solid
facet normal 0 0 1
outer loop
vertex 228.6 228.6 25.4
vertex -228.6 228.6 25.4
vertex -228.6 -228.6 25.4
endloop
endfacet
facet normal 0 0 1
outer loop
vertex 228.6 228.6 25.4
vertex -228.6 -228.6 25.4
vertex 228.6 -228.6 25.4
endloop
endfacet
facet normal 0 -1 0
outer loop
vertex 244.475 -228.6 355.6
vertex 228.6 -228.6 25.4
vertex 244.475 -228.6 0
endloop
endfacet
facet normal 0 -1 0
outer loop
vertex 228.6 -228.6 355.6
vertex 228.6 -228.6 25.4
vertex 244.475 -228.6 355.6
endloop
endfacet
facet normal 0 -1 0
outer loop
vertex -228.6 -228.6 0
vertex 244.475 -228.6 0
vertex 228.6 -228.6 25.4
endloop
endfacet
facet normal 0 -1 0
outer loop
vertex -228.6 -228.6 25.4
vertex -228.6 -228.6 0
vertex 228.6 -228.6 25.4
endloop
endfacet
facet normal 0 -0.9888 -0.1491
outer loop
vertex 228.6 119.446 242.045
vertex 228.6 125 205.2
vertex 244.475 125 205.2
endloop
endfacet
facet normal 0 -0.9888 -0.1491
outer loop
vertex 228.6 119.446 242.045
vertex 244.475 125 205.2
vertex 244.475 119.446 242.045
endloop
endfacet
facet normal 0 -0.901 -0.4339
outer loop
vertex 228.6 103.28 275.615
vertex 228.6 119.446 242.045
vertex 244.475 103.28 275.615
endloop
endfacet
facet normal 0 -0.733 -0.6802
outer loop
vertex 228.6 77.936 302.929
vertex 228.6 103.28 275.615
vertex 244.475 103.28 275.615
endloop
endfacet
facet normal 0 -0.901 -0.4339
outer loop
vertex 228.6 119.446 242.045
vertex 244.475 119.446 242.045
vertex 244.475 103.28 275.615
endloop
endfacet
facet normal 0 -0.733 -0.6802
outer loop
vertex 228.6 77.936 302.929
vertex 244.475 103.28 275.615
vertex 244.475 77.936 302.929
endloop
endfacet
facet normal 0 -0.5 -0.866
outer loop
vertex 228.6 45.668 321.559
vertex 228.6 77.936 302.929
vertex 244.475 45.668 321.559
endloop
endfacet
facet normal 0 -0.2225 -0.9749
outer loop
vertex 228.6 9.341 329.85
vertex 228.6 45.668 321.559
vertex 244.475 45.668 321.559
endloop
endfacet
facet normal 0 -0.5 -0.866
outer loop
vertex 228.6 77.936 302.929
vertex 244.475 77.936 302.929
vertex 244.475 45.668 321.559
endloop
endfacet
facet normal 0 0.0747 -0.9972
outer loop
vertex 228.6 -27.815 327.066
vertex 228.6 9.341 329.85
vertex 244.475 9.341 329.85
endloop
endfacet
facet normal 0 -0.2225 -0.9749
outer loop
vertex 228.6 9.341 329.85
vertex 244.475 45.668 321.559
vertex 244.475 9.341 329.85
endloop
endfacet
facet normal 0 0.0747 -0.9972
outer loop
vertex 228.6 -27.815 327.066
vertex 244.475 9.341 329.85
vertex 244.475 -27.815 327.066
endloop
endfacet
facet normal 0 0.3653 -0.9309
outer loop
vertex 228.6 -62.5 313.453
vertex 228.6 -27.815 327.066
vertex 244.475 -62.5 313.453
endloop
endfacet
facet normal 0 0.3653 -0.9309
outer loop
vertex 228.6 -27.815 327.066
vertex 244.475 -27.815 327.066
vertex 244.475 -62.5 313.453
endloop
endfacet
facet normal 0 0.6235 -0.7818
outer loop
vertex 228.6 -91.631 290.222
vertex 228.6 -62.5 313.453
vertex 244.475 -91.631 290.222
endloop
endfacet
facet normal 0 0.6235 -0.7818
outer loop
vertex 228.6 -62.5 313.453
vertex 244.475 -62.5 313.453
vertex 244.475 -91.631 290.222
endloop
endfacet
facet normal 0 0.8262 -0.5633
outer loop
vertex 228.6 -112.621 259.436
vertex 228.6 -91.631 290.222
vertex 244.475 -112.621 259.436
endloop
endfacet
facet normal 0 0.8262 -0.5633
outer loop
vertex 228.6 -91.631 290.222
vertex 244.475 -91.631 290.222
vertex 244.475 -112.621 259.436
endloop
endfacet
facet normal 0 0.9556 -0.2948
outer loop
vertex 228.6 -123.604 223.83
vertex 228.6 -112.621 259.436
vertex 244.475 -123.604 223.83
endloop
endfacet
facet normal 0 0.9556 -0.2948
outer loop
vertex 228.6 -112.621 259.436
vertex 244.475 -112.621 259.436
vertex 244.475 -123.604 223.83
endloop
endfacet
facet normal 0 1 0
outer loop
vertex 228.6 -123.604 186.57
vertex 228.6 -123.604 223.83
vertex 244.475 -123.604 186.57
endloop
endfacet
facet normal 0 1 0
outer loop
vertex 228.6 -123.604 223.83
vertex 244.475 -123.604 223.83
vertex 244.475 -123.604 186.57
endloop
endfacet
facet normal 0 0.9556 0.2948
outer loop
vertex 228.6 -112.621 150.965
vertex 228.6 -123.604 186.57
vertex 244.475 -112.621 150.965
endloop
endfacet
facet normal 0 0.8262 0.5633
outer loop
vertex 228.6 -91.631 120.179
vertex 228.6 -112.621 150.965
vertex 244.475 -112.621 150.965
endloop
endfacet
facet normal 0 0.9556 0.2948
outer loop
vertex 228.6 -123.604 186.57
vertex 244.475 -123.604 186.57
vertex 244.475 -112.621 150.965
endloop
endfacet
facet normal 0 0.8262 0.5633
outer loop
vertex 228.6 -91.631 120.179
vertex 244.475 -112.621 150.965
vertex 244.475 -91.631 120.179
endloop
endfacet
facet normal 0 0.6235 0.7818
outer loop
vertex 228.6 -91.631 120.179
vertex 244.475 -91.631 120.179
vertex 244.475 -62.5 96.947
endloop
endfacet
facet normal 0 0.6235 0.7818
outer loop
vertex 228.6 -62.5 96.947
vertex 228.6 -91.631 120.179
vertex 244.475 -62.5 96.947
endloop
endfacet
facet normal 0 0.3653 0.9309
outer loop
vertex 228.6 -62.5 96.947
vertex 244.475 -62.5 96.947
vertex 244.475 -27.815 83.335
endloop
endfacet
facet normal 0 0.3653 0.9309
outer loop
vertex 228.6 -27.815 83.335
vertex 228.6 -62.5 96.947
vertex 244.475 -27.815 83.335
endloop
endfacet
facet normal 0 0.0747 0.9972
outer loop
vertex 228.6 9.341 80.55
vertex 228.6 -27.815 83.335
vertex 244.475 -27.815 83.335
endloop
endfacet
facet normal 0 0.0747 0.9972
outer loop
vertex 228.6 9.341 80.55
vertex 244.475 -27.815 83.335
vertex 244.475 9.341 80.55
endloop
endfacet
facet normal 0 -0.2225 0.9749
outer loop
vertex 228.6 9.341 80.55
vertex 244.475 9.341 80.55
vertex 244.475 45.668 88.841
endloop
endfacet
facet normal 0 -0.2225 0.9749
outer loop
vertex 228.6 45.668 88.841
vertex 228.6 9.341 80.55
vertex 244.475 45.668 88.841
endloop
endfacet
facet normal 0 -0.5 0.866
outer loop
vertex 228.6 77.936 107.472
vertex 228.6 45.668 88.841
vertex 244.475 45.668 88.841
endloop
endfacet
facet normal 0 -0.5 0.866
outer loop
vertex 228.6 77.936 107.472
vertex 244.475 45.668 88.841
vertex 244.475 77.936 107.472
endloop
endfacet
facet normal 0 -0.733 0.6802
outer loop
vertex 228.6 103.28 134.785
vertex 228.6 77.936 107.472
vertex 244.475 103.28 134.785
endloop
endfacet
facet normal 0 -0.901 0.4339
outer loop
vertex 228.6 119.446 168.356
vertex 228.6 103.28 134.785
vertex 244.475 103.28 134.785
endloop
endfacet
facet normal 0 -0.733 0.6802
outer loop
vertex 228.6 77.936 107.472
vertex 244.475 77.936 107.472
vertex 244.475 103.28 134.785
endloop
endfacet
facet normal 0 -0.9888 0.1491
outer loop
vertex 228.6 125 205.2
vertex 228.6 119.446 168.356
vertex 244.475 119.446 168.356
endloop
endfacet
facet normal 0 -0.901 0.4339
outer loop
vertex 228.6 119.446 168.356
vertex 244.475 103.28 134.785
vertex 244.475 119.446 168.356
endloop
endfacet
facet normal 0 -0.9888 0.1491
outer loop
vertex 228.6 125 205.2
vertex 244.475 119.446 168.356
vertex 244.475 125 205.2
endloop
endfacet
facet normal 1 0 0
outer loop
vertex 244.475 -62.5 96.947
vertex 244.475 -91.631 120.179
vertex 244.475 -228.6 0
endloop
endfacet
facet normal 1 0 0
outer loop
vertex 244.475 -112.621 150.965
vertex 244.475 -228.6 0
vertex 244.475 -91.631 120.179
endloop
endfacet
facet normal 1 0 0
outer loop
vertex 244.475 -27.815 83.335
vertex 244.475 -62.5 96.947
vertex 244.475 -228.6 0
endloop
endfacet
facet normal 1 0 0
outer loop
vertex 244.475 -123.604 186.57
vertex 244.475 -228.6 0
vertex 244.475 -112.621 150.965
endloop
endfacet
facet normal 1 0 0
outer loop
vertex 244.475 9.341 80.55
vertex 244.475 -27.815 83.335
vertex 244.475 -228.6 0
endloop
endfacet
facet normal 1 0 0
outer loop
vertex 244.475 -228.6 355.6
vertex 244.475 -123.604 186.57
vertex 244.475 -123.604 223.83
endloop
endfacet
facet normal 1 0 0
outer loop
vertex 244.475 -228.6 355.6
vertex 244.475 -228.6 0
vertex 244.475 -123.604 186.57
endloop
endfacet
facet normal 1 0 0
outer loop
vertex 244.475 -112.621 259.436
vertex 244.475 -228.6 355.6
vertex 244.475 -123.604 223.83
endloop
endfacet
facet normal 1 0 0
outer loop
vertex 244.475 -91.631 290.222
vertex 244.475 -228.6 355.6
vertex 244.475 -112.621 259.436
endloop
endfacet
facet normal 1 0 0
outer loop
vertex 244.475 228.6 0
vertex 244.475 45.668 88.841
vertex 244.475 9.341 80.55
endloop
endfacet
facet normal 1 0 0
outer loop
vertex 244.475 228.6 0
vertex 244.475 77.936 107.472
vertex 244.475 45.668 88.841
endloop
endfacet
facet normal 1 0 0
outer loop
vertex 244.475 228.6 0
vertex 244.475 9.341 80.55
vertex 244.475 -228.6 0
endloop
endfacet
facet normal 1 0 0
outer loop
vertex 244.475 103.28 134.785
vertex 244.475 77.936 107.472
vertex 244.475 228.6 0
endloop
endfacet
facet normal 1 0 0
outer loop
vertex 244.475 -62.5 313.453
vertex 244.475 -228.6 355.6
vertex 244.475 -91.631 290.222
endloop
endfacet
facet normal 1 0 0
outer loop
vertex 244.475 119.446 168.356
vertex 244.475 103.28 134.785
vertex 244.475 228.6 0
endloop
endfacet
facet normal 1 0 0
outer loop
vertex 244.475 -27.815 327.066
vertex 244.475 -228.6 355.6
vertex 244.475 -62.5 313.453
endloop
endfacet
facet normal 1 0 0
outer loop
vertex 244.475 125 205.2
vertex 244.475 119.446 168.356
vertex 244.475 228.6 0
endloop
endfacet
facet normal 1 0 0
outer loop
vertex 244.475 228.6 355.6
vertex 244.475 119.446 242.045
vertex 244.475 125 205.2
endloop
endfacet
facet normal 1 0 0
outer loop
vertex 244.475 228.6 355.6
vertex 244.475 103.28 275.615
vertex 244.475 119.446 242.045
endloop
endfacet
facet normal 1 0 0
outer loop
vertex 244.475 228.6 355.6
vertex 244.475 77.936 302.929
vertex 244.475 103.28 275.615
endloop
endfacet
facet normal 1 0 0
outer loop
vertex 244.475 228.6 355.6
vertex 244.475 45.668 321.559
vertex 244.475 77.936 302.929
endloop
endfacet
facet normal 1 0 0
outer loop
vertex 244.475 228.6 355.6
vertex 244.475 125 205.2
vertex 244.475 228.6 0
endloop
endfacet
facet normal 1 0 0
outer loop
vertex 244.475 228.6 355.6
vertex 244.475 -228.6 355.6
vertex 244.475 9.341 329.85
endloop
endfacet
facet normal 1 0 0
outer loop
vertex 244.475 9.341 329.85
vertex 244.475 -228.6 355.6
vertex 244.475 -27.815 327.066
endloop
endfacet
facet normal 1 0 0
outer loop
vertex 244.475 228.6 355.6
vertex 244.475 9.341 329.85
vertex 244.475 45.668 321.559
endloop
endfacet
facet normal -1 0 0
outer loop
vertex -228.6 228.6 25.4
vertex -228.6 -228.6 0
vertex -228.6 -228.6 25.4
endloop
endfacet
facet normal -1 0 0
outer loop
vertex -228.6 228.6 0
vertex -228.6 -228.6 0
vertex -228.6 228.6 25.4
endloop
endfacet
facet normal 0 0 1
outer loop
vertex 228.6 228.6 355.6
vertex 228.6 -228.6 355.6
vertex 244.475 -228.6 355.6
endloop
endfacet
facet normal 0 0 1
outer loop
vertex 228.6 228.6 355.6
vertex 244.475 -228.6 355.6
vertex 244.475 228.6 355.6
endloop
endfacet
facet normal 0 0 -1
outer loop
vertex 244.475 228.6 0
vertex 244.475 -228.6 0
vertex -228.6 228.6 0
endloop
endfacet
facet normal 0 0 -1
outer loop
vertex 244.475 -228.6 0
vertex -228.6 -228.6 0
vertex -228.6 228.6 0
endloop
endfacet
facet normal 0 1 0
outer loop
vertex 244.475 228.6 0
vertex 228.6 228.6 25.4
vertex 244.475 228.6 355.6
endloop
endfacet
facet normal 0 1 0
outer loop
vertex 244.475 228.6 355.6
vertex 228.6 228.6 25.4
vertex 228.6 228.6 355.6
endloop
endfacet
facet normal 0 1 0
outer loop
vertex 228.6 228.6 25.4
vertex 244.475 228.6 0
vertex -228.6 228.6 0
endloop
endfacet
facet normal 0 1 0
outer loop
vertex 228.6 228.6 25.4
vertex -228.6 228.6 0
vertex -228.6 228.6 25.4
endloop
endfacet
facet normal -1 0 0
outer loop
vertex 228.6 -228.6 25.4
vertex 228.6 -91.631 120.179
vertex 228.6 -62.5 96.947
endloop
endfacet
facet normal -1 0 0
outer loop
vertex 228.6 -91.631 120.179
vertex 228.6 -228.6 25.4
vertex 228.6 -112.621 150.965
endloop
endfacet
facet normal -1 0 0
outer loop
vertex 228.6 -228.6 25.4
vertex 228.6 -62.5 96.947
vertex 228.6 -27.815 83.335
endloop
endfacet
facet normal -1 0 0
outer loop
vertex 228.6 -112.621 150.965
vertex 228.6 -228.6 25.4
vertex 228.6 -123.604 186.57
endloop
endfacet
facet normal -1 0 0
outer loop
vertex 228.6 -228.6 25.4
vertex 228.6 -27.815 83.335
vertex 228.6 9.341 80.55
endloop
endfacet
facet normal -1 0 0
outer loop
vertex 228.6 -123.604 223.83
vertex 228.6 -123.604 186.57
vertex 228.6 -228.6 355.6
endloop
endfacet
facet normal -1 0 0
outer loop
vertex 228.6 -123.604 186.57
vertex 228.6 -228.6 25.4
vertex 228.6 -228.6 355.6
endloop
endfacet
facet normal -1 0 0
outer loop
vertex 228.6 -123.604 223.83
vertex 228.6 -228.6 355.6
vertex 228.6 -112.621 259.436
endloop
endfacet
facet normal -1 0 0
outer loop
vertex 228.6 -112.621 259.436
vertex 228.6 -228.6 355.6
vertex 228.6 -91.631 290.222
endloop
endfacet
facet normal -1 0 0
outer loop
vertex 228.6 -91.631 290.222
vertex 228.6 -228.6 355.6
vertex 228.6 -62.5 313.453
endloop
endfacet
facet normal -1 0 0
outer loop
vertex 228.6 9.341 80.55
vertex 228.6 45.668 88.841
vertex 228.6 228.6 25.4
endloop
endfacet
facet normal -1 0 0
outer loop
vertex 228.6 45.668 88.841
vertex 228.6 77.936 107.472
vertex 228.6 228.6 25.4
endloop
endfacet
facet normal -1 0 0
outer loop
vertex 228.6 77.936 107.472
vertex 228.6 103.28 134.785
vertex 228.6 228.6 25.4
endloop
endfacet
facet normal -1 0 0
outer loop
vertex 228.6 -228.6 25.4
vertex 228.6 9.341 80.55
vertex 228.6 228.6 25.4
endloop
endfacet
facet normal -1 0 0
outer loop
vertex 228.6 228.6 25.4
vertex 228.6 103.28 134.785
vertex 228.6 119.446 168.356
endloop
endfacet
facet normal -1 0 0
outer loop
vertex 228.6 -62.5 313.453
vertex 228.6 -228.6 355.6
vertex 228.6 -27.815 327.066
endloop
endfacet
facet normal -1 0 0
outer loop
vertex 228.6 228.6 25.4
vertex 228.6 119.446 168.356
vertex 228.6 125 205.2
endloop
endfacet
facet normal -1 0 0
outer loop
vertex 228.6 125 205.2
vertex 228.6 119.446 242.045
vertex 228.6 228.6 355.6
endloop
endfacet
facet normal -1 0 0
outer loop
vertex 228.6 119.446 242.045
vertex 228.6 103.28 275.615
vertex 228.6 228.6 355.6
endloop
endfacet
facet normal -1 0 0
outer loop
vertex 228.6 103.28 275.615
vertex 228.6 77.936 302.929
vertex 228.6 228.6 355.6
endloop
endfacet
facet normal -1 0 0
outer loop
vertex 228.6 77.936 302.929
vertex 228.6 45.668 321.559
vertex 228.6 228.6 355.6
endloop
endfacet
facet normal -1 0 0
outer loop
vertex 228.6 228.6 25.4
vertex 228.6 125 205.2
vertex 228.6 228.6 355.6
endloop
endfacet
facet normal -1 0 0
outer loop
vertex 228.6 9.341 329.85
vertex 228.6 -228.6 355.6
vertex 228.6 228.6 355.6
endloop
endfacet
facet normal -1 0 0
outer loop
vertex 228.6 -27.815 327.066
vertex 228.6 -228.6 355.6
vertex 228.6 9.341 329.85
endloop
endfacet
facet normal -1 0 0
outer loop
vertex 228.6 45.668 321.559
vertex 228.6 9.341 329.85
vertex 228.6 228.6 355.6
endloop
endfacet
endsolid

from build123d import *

# Parameters (mm, degrees)
F0_W     = 457.2
F0_H     = 457.2
F1_DEPTH = 25.4
F2_W     = 457.2
F2_H     = 355.6
F3_DEPTH = 15.875
F4_R     = 124.99975
F5_DEPTH = 15.875


with BuildPart() as f1:
    # F0 (on Top) → F1 (new body)
    with BuildSketch(Plane.XY):
        Rectangle(F0_W, F0_H)
    extrude(amount=F1_DEPTH)

    # F2 (on face) → F3 (join)
    with BuildSketch(Plane.YZ.offset(228.6)):
        with Locations((0, 177.8)):
            Rectangle(F2_W, F2_H)
    extrude(amount=F3_DEPTH)

    # F4 (on face) → F5 (cut, through all)
    with BuildSketch(Plane.YZ.offset(244.475)):
        with Locations((0, 205.20025)):
            Circle(F4_R)
    extrude(amount=-F5_DEPTH, mode=Mode.SUBTRACT)


solid = f1.part
